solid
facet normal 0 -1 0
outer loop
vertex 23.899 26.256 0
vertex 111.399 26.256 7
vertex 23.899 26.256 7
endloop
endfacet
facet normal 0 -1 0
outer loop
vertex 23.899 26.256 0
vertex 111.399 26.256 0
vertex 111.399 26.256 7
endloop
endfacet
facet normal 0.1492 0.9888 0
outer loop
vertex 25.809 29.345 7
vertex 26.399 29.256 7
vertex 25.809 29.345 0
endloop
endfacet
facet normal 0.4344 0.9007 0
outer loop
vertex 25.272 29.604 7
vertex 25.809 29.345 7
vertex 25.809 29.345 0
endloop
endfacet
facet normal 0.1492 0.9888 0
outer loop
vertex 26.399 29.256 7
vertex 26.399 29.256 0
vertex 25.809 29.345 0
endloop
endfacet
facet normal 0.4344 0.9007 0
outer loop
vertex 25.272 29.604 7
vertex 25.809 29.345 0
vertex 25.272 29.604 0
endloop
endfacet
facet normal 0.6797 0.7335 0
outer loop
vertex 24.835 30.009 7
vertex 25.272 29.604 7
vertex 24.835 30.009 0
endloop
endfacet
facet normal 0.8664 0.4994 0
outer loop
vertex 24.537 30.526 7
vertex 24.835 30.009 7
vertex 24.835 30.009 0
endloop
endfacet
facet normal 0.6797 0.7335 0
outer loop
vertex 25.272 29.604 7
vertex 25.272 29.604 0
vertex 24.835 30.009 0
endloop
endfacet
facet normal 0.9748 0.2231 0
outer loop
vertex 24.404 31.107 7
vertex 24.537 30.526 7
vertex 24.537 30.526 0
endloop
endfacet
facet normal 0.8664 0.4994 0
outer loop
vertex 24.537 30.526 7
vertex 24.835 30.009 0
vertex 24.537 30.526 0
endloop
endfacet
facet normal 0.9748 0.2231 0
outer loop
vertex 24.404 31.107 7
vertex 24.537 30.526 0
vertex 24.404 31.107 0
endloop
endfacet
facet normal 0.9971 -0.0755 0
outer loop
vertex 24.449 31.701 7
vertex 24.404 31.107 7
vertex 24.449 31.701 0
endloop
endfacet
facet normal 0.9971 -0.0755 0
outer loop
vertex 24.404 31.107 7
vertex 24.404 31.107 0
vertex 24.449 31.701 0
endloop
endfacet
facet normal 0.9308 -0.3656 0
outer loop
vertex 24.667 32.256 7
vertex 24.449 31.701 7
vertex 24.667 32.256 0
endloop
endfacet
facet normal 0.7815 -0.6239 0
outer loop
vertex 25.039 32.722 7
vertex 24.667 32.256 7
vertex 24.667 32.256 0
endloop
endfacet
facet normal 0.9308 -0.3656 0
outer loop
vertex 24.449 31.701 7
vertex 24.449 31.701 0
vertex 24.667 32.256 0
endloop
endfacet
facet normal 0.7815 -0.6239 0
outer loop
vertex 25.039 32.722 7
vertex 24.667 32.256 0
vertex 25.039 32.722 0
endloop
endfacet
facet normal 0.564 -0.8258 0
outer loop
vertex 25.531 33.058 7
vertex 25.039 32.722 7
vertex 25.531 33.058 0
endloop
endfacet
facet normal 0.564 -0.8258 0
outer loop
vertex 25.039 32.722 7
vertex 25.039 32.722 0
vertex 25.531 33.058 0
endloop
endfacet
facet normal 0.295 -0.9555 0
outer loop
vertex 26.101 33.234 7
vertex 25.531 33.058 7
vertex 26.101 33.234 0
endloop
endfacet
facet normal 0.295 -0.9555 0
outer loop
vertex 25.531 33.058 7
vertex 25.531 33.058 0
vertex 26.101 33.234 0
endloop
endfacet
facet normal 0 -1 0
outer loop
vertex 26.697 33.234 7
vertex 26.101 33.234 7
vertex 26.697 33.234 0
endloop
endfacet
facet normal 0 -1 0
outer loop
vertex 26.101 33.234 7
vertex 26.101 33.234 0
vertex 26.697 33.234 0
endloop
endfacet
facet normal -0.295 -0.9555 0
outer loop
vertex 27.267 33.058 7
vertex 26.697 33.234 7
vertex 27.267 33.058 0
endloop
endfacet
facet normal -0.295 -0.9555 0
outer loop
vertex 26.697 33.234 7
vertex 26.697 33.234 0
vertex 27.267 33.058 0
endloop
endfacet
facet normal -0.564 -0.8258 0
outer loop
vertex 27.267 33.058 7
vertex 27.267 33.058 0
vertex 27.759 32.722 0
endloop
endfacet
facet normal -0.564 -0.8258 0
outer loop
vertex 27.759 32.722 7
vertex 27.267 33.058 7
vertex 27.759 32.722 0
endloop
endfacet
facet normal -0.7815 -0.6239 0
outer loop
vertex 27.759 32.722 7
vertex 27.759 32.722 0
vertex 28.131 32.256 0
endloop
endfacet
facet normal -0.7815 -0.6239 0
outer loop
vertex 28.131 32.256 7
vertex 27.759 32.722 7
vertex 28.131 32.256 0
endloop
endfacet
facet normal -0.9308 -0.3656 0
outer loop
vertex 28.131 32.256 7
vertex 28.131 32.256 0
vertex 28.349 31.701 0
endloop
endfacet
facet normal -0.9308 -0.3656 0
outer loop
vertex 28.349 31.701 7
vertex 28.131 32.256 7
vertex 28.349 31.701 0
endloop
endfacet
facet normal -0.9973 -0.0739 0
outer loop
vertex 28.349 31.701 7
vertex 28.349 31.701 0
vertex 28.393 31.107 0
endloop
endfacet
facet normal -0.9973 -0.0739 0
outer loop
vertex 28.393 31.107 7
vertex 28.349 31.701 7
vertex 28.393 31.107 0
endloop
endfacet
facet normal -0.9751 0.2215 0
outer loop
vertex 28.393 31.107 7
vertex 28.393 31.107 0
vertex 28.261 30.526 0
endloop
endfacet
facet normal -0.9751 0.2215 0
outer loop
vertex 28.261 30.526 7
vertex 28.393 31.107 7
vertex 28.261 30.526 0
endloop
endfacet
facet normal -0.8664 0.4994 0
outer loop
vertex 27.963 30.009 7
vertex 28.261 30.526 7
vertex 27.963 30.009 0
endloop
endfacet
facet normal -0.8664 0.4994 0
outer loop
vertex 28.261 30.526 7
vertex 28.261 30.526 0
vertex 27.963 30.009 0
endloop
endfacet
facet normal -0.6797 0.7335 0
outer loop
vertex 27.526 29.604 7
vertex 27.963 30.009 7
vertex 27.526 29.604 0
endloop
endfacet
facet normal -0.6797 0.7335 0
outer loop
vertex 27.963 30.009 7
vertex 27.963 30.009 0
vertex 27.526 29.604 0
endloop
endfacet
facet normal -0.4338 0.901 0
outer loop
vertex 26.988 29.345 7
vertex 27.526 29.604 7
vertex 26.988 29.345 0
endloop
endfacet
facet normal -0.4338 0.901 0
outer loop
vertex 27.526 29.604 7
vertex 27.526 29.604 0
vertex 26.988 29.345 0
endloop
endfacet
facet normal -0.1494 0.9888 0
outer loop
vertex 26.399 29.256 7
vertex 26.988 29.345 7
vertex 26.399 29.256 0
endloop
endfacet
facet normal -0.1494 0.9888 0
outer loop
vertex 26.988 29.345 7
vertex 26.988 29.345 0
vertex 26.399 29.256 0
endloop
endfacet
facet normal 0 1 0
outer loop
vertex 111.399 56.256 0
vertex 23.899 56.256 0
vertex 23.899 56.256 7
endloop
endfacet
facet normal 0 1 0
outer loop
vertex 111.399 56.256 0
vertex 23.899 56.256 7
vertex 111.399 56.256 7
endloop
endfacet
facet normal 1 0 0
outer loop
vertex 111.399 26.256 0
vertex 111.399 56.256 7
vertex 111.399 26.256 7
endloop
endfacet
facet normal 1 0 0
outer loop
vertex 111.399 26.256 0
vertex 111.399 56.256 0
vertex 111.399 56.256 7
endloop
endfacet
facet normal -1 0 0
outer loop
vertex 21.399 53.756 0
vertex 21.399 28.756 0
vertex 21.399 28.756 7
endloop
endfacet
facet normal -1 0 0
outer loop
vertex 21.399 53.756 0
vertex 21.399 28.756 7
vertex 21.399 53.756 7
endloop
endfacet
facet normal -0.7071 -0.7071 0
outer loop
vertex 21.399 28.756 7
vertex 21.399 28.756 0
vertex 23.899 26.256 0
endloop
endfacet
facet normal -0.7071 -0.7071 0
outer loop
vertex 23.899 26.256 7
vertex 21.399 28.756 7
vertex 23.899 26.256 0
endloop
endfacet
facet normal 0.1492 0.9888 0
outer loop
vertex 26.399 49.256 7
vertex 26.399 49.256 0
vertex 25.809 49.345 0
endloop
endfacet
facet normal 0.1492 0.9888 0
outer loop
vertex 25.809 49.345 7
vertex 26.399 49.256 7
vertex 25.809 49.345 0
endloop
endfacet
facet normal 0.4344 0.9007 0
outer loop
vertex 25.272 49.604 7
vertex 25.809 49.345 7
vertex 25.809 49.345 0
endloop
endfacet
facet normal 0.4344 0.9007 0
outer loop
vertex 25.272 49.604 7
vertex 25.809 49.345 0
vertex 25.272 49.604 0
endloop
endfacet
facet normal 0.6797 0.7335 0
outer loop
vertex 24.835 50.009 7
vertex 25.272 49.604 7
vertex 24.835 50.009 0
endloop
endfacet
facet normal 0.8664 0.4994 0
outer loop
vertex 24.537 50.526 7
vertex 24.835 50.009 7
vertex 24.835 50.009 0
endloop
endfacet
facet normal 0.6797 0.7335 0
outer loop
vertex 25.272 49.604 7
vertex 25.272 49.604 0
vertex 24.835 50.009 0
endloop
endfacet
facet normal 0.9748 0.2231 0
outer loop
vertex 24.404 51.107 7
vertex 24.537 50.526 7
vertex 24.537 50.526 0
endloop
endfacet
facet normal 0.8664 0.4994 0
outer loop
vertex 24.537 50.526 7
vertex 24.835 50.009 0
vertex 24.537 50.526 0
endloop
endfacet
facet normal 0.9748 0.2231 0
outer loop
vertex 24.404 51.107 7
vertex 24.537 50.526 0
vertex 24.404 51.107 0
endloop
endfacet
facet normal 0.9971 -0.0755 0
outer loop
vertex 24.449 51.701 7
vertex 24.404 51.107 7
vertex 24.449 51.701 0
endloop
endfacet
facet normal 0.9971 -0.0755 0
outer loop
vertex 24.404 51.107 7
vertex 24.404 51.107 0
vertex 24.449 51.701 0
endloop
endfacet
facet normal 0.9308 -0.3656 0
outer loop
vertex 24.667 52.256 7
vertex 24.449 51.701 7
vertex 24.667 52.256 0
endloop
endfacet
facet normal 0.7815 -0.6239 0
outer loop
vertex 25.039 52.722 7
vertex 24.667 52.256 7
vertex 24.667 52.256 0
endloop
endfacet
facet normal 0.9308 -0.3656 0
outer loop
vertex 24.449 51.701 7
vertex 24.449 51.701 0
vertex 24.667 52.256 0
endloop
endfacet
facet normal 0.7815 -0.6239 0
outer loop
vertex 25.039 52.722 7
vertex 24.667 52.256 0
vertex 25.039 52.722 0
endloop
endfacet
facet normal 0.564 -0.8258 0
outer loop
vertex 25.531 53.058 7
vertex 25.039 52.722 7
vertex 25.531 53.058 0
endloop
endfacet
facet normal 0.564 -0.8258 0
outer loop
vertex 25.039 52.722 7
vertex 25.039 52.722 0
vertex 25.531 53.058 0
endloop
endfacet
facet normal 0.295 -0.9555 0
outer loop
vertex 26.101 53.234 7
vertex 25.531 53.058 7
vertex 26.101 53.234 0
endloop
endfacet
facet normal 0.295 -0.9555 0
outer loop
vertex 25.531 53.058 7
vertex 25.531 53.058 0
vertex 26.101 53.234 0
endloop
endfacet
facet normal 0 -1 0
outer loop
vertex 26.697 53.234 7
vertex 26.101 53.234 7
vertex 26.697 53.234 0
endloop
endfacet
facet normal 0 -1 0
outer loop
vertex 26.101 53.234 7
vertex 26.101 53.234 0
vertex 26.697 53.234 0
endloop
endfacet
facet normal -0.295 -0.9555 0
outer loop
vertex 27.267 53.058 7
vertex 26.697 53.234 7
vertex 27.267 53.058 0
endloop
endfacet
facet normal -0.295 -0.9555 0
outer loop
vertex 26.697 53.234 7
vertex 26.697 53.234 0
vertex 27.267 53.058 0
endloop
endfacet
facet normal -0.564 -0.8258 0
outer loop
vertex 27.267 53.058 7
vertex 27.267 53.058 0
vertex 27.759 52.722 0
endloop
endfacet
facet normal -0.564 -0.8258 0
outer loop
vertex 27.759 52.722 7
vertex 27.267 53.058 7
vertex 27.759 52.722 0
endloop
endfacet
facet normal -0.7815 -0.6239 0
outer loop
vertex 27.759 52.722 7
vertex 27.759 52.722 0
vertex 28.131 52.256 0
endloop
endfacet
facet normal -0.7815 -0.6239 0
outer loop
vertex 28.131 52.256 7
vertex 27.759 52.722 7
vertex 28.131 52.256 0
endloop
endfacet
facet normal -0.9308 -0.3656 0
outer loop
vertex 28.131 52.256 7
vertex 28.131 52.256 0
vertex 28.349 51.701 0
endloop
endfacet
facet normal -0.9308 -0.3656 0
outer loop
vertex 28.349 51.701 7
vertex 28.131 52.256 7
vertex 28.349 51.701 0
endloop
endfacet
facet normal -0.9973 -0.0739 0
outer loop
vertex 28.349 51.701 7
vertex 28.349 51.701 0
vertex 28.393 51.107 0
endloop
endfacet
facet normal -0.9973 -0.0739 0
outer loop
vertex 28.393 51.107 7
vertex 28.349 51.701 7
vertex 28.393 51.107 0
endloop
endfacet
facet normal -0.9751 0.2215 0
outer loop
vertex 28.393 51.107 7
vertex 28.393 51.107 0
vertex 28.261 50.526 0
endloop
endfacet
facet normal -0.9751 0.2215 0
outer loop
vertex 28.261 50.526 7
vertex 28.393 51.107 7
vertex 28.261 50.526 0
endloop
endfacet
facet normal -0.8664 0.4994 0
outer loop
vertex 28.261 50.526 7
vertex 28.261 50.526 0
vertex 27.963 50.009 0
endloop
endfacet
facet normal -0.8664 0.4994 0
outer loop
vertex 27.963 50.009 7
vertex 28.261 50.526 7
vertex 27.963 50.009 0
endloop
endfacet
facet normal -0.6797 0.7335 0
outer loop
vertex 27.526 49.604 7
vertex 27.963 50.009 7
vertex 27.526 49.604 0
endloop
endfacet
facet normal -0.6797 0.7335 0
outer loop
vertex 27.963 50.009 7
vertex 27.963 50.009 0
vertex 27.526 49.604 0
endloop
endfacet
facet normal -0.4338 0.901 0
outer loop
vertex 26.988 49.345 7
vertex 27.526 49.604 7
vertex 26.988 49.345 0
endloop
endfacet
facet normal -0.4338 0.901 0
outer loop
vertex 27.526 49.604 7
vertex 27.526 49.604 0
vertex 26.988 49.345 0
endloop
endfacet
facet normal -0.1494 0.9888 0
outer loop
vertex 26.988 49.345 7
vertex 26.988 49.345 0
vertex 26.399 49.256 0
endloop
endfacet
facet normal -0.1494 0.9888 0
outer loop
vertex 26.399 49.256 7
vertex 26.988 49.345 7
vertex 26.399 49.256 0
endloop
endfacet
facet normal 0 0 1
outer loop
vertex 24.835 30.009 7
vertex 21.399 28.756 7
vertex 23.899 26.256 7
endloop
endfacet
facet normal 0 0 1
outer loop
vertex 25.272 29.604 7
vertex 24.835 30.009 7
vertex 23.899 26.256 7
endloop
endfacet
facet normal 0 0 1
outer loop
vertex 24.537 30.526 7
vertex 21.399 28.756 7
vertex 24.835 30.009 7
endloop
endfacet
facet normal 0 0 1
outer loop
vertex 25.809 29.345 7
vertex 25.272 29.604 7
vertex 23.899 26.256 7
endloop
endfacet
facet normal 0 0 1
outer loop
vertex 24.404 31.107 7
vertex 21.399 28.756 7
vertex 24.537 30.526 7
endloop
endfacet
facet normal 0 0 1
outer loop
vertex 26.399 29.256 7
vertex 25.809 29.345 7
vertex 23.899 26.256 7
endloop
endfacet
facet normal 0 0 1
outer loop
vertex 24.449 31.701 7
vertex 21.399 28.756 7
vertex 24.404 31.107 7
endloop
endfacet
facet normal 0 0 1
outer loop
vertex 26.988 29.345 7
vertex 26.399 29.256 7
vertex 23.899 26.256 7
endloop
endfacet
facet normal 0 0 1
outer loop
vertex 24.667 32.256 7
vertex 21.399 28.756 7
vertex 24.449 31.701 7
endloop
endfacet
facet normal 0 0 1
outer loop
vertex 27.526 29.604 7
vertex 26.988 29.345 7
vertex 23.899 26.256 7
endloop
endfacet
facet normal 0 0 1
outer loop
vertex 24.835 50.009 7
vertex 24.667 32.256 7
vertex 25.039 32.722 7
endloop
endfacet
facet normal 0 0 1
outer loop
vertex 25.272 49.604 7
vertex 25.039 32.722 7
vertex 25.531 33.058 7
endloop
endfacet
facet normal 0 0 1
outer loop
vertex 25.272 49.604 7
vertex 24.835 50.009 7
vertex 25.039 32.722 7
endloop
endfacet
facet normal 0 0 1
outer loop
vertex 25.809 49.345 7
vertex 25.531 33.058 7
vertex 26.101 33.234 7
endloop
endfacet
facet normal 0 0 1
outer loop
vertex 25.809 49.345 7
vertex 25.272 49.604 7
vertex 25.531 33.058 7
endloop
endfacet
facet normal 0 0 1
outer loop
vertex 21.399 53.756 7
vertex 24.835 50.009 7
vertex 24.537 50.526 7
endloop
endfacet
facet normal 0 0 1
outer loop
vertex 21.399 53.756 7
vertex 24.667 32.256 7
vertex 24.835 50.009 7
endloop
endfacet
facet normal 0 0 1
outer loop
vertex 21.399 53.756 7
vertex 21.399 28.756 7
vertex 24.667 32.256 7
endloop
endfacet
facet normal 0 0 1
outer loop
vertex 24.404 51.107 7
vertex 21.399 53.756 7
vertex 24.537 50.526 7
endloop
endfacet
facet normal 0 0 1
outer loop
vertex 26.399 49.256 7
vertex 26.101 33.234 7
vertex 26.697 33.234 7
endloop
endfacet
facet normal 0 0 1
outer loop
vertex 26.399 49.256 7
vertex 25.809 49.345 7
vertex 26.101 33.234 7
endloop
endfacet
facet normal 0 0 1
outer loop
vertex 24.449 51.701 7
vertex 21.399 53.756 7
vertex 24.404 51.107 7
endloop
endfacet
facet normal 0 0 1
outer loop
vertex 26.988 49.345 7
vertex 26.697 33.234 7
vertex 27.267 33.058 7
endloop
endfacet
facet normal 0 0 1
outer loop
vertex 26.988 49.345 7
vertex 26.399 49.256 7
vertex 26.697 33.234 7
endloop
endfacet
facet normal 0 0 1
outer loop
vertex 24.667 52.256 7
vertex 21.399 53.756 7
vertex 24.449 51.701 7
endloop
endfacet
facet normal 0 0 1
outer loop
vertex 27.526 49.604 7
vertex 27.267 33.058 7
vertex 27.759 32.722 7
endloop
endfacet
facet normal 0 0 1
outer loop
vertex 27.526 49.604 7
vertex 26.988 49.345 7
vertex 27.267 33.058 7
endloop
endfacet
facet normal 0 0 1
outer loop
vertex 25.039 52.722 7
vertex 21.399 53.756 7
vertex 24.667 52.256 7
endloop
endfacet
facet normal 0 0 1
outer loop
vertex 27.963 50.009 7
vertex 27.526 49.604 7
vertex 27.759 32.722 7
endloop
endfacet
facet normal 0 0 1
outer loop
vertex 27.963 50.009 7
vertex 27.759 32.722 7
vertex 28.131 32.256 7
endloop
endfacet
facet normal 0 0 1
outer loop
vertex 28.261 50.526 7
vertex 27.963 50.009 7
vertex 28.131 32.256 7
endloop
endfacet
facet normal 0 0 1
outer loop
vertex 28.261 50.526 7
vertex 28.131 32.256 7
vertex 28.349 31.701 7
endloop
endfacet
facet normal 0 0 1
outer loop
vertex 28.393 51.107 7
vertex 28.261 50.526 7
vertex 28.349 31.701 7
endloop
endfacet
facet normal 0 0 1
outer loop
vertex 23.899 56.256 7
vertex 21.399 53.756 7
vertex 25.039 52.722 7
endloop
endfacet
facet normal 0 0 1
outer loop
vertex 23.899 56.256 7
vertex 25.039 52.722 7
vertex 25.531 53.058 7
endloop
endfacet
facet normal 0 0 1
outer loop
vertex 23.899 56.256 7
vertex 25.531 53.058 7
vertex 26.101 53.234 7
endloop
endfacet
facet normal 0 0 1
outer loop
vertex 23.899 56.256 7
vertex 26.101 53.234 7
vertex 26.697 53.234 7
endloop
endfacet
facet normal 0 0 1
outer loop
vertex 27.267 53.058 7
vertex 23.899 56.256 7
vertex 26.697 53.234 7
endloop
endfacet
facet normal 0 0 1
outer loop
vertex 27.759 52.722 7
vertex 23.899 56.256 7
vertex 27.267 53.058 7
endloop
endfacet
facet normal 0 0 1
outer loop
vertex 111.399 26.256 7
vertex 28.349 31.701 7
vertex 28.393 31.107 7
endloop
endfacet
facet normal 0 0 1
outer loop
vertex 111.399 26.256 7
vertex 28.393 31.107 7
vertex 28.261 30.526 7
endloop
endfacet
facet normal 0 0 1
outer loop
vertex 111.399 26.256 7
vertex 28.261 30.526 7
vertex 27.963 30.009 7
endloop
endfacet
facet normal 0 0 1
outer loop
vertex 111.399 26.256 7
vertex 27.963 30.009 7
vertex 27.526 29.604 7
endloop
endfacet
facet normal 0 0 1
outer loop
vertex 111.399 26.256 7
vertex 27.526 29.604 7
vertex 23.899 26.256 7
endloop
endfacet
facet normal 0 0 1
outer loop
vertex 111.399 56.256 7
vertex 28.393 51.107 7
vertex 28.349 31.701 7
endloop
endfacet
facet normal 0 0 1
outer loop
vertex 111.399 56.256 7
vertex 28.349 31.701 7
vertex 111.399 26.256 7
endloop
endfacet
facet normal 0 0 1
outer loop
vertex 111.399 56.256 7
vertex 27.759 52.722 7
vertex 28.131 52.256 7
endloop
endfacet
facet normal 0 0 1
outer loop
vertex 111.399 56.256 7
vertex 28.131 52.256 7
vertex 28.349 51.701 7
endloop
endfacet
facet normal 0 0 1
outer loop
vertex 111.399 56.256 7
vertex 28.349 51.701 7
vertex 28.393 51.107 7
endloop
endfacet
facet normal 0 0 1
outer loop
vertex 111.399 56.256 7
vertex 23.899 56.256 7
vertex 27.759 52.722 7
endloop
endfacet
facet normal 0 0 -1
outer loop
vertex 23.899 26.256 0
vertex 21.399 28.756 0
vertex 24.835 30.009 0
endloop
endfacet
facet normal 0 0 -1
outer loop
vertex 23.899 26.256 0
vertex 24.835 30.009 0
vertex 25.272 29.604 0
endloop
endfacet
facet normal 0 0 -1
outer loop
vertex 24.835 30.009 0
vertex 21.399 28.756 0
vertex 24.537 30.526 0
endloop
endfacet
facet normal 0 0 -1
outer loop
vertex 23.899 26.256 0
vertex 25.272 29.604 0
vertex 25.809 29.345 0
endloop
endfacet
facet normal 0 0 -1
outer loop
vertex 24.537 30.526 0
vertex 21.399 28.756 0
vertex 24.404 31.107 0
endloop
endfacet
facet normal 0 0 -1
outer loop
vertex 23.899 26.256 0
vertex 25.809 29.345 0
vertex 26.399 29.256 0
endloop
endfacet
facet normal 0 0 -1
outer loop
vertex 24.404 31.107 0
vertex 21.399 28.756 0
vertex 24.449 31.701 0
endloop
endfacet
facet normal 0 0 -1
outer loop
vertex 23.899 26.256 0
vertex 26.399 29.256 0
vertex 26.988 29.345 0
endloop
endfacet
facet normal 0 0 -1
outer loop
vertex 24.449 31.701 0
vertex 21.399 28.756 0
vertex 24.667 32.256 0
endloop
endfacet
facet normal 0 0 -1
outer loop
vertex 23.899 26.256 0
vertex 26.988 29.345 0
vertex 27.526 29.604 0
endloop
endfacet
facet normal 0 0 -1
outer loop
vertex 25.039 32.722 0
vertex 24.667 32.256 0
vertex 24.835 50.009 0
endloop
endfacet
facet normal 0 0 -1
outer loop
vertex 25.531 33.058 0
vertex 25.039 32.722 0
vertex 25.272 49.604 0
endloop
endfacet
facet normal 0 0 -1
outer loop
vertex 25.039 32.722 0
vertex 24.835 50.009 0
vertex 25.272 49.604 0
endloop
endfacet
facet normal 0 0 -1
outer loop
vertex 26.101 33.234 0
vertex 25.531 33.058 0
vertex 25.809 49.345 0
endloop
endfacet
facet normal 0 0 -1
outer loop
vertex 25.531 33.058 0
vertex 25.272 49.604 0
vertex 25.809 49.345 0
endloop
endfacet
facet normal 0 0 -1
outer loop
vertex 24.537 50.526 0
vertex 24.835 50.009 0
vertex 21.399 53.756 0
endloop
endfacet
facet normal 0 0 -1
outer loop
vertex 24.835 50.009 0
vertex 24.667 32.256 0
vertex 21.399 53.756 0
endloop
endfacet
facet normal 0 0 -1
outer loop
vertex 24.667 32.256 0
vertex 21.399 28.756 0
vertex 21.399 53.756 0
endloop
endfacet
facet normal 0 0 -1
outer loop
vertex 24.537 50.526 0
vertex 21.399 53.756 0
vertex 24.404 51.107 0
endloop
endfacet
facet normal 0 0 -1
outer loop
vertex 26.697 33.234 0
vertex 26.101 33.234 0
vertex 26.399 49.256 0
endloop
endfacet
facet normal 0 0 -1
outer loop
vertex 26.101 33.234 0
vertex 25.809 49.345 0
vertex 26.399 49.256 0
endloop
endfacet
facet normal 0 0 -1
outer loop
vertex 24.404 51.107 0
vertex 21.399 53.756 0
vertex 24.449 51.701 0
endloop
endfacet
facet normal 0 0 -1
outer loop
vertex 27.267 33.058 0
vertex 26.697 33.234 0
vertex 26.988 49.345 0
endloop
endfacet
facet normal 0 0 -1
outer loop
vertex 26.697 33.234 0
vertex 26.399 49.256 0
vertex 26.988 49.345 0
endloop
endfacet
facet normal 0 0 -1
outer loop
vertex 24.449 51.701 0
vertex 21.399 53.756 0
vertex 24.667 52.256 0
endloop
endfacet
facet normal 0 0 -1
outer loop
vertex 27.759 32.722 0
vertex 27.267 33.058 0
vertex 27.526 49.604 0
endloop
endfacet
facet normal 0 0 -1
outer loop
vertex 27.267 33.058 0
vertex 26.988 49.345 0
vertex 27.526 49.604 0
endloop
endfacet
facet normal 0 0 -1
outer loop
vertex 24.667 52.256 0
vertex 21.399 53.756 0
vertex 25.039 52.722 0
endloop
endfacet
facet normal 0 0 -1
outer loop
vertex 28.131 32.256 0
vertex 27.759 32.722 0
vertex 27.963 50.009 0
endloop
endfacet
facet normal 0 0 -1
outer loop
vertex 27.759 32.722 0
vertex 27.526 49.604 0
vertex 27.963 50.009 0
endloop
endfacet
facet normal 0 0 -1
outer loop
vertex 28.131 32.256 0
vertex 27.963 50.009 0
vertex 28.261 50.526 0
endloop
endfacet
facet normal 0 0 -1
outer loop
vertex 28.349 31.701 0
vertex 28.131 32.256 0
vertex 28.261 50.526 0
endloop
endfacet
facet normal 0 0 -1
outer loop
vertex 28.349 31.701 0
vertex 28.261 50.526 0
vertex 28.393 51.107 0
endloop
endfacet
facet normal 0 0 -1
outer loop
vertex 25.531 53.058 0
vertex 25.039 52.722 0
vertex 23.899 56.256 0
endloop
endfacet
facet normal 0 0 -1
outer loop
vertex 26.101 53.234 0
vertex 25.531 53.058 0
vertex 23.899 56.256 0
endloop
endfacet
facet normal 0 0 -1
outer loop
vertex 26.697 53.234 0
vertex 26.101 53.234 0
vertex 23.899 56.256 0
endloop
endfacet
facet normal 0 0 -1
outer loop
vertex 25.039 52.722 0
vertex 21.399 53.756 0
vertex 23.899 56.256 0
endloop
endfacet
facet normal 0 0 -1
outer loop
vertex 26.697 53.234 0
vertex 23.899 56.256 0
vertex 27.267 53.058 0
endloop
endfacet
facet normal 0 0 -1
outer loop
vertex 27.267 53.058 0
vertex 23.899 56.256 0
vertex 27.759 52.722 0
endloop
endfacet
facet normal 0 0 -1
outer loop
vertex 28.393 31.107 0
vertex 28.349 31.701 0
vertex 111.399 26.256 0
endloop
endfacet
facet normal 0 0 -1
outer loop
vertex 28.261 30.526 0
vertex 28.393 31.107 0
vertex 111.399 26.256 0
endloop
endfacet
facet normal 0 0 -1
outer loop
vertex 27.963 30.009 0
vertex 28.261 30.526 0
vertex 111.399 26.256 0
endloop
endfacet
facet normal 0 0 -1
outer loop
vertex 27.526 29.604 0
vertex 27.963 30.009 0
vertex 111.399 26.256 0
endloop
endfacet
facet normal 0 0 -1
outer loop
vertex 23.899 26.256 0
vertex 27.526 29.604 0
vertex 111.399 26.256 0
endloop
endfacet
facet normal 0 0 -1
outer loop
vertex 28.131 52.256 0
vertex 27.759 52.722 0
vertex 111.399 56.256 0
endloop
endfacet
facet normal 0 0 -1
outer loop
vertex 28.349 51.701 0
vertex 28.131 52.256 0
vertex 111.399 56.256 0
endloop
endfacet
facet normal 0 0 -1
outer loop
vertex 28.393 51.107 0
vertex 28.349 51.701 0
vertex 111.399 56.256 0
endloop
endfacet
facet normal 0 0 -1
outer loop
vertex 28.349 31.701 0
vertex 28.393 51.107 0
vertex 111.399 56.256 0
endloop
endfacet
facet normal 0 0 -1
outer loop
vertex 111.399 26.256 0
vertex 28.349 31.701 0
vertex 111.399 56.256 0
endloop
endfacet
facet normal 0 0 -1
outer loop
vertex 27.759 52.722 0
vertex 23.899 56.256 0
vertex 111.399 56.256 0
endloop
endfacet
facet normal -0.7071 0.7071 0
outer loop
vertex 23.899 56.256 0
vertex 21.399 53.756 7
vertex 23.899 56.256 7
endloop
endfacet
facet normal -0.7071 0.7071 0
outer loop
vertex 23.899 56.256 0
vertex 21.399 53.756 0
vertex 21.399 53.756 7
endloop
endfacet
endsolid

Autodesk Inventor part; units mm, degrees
ref_plane "YZ Plane" through (0, 0, 0) normal (1, 0, 0) x (0, 1, 0)
ref_plane "XZ Plane" through (0, 0, 0) normal (0, 1, 0) x (-1, 0, 0)
ref_plane "XY Plane" through (0, 0, 0) normal (0, 0, 1) x (1, 0, 0)
sketch "Sketch1" plane through (0, 0, 0) normal (0, 0, 1) x (1, 0, 0)
  line L0 (23.8989, 56.2562) -> (111.3989, 56.2562)
  line L1 (111.3989, 56.2562) -> (111.3989, 26.2562)
  line L2 (111.3989, 26.2562) -> (23.8989, 26.2562)
  line L3 (21.3989, 28.7562) -> (21.3989, 53.7562)
  line L4 (21.3989, 53.7562) -> (23.8989, 56.2562)
  line L5 (21.3989, 28.7562) -> (23.8989, 26.2562)
  point P0 (0, 0)
  point P1 (21.3989, 56.2562)
  point P2 (21.3989, 26.2562)
  dimension "d0" = 30
  dimension "d1" = 90
  dimension "d2" = 2.5
  dimension "d3" = 2.5
  dimension "d4" = 2.5
  dimension "d5" = 2.5
extrude "Extrusion1" add sketch "Sketch1" along normal blind 7
sketch "Sketch2" plane through (0, 0, 7) normal (0, 0, 1) x (1, 0, 0)
  line L0 (111.3989, 26.2562) -> (111.3989, 56.2562) construction
  line L1 (111.3989, 41.2562) -> (21.3989, 41.2562) construction
  line L2 (21.3989, 53.7562) -> (21.3989, 28.7562) construction
  line L3 (23.8989, 26.2562) -> (111.3989, 26.2562) projected
  point P0 (0, 0)
  point P1 (26.3989, 31.2562)
  point P2 (26.3989, 51.2562)
  dimension "d8" = 5
  dimension "d9" = 5
hole "Hole1" at (26.3989, 31.2562, 7) at (26.3989, 51.2562, 7) direction (0, 0, -1) diameter 4 end through all
sketch "Sketch3" plane through (0, 0, 7) normal (0, 0, 1) x (1, 0, 0)
  circle A0 centre (67.6489, 41.2562) radius 12.5 construction
  line L0 (21.3989, 53.7562) -> (21.3989, 28.7562) projected
  line L1 (21.3989, 41.2562) -> (111.3989, 41.2562) construction
  line L2 (111.3989, 26.2562) -> (111.3989, 56.2562) projected
  line L3 (23.8989, 26.2562) -> (111.3989, 26.2562) construction
  line L4 (67.6489, 26.2562) -> (67.6489, 56.2562) construction
  point P0 (0, 0)
  dimension "d17" = 25
equation "\"d3\" = d2"
equation "\"d4\" = d2"
equation "\"d5\" = d4"
properties part number "Dedo" material "MDF Medium Density Fiberboard"
